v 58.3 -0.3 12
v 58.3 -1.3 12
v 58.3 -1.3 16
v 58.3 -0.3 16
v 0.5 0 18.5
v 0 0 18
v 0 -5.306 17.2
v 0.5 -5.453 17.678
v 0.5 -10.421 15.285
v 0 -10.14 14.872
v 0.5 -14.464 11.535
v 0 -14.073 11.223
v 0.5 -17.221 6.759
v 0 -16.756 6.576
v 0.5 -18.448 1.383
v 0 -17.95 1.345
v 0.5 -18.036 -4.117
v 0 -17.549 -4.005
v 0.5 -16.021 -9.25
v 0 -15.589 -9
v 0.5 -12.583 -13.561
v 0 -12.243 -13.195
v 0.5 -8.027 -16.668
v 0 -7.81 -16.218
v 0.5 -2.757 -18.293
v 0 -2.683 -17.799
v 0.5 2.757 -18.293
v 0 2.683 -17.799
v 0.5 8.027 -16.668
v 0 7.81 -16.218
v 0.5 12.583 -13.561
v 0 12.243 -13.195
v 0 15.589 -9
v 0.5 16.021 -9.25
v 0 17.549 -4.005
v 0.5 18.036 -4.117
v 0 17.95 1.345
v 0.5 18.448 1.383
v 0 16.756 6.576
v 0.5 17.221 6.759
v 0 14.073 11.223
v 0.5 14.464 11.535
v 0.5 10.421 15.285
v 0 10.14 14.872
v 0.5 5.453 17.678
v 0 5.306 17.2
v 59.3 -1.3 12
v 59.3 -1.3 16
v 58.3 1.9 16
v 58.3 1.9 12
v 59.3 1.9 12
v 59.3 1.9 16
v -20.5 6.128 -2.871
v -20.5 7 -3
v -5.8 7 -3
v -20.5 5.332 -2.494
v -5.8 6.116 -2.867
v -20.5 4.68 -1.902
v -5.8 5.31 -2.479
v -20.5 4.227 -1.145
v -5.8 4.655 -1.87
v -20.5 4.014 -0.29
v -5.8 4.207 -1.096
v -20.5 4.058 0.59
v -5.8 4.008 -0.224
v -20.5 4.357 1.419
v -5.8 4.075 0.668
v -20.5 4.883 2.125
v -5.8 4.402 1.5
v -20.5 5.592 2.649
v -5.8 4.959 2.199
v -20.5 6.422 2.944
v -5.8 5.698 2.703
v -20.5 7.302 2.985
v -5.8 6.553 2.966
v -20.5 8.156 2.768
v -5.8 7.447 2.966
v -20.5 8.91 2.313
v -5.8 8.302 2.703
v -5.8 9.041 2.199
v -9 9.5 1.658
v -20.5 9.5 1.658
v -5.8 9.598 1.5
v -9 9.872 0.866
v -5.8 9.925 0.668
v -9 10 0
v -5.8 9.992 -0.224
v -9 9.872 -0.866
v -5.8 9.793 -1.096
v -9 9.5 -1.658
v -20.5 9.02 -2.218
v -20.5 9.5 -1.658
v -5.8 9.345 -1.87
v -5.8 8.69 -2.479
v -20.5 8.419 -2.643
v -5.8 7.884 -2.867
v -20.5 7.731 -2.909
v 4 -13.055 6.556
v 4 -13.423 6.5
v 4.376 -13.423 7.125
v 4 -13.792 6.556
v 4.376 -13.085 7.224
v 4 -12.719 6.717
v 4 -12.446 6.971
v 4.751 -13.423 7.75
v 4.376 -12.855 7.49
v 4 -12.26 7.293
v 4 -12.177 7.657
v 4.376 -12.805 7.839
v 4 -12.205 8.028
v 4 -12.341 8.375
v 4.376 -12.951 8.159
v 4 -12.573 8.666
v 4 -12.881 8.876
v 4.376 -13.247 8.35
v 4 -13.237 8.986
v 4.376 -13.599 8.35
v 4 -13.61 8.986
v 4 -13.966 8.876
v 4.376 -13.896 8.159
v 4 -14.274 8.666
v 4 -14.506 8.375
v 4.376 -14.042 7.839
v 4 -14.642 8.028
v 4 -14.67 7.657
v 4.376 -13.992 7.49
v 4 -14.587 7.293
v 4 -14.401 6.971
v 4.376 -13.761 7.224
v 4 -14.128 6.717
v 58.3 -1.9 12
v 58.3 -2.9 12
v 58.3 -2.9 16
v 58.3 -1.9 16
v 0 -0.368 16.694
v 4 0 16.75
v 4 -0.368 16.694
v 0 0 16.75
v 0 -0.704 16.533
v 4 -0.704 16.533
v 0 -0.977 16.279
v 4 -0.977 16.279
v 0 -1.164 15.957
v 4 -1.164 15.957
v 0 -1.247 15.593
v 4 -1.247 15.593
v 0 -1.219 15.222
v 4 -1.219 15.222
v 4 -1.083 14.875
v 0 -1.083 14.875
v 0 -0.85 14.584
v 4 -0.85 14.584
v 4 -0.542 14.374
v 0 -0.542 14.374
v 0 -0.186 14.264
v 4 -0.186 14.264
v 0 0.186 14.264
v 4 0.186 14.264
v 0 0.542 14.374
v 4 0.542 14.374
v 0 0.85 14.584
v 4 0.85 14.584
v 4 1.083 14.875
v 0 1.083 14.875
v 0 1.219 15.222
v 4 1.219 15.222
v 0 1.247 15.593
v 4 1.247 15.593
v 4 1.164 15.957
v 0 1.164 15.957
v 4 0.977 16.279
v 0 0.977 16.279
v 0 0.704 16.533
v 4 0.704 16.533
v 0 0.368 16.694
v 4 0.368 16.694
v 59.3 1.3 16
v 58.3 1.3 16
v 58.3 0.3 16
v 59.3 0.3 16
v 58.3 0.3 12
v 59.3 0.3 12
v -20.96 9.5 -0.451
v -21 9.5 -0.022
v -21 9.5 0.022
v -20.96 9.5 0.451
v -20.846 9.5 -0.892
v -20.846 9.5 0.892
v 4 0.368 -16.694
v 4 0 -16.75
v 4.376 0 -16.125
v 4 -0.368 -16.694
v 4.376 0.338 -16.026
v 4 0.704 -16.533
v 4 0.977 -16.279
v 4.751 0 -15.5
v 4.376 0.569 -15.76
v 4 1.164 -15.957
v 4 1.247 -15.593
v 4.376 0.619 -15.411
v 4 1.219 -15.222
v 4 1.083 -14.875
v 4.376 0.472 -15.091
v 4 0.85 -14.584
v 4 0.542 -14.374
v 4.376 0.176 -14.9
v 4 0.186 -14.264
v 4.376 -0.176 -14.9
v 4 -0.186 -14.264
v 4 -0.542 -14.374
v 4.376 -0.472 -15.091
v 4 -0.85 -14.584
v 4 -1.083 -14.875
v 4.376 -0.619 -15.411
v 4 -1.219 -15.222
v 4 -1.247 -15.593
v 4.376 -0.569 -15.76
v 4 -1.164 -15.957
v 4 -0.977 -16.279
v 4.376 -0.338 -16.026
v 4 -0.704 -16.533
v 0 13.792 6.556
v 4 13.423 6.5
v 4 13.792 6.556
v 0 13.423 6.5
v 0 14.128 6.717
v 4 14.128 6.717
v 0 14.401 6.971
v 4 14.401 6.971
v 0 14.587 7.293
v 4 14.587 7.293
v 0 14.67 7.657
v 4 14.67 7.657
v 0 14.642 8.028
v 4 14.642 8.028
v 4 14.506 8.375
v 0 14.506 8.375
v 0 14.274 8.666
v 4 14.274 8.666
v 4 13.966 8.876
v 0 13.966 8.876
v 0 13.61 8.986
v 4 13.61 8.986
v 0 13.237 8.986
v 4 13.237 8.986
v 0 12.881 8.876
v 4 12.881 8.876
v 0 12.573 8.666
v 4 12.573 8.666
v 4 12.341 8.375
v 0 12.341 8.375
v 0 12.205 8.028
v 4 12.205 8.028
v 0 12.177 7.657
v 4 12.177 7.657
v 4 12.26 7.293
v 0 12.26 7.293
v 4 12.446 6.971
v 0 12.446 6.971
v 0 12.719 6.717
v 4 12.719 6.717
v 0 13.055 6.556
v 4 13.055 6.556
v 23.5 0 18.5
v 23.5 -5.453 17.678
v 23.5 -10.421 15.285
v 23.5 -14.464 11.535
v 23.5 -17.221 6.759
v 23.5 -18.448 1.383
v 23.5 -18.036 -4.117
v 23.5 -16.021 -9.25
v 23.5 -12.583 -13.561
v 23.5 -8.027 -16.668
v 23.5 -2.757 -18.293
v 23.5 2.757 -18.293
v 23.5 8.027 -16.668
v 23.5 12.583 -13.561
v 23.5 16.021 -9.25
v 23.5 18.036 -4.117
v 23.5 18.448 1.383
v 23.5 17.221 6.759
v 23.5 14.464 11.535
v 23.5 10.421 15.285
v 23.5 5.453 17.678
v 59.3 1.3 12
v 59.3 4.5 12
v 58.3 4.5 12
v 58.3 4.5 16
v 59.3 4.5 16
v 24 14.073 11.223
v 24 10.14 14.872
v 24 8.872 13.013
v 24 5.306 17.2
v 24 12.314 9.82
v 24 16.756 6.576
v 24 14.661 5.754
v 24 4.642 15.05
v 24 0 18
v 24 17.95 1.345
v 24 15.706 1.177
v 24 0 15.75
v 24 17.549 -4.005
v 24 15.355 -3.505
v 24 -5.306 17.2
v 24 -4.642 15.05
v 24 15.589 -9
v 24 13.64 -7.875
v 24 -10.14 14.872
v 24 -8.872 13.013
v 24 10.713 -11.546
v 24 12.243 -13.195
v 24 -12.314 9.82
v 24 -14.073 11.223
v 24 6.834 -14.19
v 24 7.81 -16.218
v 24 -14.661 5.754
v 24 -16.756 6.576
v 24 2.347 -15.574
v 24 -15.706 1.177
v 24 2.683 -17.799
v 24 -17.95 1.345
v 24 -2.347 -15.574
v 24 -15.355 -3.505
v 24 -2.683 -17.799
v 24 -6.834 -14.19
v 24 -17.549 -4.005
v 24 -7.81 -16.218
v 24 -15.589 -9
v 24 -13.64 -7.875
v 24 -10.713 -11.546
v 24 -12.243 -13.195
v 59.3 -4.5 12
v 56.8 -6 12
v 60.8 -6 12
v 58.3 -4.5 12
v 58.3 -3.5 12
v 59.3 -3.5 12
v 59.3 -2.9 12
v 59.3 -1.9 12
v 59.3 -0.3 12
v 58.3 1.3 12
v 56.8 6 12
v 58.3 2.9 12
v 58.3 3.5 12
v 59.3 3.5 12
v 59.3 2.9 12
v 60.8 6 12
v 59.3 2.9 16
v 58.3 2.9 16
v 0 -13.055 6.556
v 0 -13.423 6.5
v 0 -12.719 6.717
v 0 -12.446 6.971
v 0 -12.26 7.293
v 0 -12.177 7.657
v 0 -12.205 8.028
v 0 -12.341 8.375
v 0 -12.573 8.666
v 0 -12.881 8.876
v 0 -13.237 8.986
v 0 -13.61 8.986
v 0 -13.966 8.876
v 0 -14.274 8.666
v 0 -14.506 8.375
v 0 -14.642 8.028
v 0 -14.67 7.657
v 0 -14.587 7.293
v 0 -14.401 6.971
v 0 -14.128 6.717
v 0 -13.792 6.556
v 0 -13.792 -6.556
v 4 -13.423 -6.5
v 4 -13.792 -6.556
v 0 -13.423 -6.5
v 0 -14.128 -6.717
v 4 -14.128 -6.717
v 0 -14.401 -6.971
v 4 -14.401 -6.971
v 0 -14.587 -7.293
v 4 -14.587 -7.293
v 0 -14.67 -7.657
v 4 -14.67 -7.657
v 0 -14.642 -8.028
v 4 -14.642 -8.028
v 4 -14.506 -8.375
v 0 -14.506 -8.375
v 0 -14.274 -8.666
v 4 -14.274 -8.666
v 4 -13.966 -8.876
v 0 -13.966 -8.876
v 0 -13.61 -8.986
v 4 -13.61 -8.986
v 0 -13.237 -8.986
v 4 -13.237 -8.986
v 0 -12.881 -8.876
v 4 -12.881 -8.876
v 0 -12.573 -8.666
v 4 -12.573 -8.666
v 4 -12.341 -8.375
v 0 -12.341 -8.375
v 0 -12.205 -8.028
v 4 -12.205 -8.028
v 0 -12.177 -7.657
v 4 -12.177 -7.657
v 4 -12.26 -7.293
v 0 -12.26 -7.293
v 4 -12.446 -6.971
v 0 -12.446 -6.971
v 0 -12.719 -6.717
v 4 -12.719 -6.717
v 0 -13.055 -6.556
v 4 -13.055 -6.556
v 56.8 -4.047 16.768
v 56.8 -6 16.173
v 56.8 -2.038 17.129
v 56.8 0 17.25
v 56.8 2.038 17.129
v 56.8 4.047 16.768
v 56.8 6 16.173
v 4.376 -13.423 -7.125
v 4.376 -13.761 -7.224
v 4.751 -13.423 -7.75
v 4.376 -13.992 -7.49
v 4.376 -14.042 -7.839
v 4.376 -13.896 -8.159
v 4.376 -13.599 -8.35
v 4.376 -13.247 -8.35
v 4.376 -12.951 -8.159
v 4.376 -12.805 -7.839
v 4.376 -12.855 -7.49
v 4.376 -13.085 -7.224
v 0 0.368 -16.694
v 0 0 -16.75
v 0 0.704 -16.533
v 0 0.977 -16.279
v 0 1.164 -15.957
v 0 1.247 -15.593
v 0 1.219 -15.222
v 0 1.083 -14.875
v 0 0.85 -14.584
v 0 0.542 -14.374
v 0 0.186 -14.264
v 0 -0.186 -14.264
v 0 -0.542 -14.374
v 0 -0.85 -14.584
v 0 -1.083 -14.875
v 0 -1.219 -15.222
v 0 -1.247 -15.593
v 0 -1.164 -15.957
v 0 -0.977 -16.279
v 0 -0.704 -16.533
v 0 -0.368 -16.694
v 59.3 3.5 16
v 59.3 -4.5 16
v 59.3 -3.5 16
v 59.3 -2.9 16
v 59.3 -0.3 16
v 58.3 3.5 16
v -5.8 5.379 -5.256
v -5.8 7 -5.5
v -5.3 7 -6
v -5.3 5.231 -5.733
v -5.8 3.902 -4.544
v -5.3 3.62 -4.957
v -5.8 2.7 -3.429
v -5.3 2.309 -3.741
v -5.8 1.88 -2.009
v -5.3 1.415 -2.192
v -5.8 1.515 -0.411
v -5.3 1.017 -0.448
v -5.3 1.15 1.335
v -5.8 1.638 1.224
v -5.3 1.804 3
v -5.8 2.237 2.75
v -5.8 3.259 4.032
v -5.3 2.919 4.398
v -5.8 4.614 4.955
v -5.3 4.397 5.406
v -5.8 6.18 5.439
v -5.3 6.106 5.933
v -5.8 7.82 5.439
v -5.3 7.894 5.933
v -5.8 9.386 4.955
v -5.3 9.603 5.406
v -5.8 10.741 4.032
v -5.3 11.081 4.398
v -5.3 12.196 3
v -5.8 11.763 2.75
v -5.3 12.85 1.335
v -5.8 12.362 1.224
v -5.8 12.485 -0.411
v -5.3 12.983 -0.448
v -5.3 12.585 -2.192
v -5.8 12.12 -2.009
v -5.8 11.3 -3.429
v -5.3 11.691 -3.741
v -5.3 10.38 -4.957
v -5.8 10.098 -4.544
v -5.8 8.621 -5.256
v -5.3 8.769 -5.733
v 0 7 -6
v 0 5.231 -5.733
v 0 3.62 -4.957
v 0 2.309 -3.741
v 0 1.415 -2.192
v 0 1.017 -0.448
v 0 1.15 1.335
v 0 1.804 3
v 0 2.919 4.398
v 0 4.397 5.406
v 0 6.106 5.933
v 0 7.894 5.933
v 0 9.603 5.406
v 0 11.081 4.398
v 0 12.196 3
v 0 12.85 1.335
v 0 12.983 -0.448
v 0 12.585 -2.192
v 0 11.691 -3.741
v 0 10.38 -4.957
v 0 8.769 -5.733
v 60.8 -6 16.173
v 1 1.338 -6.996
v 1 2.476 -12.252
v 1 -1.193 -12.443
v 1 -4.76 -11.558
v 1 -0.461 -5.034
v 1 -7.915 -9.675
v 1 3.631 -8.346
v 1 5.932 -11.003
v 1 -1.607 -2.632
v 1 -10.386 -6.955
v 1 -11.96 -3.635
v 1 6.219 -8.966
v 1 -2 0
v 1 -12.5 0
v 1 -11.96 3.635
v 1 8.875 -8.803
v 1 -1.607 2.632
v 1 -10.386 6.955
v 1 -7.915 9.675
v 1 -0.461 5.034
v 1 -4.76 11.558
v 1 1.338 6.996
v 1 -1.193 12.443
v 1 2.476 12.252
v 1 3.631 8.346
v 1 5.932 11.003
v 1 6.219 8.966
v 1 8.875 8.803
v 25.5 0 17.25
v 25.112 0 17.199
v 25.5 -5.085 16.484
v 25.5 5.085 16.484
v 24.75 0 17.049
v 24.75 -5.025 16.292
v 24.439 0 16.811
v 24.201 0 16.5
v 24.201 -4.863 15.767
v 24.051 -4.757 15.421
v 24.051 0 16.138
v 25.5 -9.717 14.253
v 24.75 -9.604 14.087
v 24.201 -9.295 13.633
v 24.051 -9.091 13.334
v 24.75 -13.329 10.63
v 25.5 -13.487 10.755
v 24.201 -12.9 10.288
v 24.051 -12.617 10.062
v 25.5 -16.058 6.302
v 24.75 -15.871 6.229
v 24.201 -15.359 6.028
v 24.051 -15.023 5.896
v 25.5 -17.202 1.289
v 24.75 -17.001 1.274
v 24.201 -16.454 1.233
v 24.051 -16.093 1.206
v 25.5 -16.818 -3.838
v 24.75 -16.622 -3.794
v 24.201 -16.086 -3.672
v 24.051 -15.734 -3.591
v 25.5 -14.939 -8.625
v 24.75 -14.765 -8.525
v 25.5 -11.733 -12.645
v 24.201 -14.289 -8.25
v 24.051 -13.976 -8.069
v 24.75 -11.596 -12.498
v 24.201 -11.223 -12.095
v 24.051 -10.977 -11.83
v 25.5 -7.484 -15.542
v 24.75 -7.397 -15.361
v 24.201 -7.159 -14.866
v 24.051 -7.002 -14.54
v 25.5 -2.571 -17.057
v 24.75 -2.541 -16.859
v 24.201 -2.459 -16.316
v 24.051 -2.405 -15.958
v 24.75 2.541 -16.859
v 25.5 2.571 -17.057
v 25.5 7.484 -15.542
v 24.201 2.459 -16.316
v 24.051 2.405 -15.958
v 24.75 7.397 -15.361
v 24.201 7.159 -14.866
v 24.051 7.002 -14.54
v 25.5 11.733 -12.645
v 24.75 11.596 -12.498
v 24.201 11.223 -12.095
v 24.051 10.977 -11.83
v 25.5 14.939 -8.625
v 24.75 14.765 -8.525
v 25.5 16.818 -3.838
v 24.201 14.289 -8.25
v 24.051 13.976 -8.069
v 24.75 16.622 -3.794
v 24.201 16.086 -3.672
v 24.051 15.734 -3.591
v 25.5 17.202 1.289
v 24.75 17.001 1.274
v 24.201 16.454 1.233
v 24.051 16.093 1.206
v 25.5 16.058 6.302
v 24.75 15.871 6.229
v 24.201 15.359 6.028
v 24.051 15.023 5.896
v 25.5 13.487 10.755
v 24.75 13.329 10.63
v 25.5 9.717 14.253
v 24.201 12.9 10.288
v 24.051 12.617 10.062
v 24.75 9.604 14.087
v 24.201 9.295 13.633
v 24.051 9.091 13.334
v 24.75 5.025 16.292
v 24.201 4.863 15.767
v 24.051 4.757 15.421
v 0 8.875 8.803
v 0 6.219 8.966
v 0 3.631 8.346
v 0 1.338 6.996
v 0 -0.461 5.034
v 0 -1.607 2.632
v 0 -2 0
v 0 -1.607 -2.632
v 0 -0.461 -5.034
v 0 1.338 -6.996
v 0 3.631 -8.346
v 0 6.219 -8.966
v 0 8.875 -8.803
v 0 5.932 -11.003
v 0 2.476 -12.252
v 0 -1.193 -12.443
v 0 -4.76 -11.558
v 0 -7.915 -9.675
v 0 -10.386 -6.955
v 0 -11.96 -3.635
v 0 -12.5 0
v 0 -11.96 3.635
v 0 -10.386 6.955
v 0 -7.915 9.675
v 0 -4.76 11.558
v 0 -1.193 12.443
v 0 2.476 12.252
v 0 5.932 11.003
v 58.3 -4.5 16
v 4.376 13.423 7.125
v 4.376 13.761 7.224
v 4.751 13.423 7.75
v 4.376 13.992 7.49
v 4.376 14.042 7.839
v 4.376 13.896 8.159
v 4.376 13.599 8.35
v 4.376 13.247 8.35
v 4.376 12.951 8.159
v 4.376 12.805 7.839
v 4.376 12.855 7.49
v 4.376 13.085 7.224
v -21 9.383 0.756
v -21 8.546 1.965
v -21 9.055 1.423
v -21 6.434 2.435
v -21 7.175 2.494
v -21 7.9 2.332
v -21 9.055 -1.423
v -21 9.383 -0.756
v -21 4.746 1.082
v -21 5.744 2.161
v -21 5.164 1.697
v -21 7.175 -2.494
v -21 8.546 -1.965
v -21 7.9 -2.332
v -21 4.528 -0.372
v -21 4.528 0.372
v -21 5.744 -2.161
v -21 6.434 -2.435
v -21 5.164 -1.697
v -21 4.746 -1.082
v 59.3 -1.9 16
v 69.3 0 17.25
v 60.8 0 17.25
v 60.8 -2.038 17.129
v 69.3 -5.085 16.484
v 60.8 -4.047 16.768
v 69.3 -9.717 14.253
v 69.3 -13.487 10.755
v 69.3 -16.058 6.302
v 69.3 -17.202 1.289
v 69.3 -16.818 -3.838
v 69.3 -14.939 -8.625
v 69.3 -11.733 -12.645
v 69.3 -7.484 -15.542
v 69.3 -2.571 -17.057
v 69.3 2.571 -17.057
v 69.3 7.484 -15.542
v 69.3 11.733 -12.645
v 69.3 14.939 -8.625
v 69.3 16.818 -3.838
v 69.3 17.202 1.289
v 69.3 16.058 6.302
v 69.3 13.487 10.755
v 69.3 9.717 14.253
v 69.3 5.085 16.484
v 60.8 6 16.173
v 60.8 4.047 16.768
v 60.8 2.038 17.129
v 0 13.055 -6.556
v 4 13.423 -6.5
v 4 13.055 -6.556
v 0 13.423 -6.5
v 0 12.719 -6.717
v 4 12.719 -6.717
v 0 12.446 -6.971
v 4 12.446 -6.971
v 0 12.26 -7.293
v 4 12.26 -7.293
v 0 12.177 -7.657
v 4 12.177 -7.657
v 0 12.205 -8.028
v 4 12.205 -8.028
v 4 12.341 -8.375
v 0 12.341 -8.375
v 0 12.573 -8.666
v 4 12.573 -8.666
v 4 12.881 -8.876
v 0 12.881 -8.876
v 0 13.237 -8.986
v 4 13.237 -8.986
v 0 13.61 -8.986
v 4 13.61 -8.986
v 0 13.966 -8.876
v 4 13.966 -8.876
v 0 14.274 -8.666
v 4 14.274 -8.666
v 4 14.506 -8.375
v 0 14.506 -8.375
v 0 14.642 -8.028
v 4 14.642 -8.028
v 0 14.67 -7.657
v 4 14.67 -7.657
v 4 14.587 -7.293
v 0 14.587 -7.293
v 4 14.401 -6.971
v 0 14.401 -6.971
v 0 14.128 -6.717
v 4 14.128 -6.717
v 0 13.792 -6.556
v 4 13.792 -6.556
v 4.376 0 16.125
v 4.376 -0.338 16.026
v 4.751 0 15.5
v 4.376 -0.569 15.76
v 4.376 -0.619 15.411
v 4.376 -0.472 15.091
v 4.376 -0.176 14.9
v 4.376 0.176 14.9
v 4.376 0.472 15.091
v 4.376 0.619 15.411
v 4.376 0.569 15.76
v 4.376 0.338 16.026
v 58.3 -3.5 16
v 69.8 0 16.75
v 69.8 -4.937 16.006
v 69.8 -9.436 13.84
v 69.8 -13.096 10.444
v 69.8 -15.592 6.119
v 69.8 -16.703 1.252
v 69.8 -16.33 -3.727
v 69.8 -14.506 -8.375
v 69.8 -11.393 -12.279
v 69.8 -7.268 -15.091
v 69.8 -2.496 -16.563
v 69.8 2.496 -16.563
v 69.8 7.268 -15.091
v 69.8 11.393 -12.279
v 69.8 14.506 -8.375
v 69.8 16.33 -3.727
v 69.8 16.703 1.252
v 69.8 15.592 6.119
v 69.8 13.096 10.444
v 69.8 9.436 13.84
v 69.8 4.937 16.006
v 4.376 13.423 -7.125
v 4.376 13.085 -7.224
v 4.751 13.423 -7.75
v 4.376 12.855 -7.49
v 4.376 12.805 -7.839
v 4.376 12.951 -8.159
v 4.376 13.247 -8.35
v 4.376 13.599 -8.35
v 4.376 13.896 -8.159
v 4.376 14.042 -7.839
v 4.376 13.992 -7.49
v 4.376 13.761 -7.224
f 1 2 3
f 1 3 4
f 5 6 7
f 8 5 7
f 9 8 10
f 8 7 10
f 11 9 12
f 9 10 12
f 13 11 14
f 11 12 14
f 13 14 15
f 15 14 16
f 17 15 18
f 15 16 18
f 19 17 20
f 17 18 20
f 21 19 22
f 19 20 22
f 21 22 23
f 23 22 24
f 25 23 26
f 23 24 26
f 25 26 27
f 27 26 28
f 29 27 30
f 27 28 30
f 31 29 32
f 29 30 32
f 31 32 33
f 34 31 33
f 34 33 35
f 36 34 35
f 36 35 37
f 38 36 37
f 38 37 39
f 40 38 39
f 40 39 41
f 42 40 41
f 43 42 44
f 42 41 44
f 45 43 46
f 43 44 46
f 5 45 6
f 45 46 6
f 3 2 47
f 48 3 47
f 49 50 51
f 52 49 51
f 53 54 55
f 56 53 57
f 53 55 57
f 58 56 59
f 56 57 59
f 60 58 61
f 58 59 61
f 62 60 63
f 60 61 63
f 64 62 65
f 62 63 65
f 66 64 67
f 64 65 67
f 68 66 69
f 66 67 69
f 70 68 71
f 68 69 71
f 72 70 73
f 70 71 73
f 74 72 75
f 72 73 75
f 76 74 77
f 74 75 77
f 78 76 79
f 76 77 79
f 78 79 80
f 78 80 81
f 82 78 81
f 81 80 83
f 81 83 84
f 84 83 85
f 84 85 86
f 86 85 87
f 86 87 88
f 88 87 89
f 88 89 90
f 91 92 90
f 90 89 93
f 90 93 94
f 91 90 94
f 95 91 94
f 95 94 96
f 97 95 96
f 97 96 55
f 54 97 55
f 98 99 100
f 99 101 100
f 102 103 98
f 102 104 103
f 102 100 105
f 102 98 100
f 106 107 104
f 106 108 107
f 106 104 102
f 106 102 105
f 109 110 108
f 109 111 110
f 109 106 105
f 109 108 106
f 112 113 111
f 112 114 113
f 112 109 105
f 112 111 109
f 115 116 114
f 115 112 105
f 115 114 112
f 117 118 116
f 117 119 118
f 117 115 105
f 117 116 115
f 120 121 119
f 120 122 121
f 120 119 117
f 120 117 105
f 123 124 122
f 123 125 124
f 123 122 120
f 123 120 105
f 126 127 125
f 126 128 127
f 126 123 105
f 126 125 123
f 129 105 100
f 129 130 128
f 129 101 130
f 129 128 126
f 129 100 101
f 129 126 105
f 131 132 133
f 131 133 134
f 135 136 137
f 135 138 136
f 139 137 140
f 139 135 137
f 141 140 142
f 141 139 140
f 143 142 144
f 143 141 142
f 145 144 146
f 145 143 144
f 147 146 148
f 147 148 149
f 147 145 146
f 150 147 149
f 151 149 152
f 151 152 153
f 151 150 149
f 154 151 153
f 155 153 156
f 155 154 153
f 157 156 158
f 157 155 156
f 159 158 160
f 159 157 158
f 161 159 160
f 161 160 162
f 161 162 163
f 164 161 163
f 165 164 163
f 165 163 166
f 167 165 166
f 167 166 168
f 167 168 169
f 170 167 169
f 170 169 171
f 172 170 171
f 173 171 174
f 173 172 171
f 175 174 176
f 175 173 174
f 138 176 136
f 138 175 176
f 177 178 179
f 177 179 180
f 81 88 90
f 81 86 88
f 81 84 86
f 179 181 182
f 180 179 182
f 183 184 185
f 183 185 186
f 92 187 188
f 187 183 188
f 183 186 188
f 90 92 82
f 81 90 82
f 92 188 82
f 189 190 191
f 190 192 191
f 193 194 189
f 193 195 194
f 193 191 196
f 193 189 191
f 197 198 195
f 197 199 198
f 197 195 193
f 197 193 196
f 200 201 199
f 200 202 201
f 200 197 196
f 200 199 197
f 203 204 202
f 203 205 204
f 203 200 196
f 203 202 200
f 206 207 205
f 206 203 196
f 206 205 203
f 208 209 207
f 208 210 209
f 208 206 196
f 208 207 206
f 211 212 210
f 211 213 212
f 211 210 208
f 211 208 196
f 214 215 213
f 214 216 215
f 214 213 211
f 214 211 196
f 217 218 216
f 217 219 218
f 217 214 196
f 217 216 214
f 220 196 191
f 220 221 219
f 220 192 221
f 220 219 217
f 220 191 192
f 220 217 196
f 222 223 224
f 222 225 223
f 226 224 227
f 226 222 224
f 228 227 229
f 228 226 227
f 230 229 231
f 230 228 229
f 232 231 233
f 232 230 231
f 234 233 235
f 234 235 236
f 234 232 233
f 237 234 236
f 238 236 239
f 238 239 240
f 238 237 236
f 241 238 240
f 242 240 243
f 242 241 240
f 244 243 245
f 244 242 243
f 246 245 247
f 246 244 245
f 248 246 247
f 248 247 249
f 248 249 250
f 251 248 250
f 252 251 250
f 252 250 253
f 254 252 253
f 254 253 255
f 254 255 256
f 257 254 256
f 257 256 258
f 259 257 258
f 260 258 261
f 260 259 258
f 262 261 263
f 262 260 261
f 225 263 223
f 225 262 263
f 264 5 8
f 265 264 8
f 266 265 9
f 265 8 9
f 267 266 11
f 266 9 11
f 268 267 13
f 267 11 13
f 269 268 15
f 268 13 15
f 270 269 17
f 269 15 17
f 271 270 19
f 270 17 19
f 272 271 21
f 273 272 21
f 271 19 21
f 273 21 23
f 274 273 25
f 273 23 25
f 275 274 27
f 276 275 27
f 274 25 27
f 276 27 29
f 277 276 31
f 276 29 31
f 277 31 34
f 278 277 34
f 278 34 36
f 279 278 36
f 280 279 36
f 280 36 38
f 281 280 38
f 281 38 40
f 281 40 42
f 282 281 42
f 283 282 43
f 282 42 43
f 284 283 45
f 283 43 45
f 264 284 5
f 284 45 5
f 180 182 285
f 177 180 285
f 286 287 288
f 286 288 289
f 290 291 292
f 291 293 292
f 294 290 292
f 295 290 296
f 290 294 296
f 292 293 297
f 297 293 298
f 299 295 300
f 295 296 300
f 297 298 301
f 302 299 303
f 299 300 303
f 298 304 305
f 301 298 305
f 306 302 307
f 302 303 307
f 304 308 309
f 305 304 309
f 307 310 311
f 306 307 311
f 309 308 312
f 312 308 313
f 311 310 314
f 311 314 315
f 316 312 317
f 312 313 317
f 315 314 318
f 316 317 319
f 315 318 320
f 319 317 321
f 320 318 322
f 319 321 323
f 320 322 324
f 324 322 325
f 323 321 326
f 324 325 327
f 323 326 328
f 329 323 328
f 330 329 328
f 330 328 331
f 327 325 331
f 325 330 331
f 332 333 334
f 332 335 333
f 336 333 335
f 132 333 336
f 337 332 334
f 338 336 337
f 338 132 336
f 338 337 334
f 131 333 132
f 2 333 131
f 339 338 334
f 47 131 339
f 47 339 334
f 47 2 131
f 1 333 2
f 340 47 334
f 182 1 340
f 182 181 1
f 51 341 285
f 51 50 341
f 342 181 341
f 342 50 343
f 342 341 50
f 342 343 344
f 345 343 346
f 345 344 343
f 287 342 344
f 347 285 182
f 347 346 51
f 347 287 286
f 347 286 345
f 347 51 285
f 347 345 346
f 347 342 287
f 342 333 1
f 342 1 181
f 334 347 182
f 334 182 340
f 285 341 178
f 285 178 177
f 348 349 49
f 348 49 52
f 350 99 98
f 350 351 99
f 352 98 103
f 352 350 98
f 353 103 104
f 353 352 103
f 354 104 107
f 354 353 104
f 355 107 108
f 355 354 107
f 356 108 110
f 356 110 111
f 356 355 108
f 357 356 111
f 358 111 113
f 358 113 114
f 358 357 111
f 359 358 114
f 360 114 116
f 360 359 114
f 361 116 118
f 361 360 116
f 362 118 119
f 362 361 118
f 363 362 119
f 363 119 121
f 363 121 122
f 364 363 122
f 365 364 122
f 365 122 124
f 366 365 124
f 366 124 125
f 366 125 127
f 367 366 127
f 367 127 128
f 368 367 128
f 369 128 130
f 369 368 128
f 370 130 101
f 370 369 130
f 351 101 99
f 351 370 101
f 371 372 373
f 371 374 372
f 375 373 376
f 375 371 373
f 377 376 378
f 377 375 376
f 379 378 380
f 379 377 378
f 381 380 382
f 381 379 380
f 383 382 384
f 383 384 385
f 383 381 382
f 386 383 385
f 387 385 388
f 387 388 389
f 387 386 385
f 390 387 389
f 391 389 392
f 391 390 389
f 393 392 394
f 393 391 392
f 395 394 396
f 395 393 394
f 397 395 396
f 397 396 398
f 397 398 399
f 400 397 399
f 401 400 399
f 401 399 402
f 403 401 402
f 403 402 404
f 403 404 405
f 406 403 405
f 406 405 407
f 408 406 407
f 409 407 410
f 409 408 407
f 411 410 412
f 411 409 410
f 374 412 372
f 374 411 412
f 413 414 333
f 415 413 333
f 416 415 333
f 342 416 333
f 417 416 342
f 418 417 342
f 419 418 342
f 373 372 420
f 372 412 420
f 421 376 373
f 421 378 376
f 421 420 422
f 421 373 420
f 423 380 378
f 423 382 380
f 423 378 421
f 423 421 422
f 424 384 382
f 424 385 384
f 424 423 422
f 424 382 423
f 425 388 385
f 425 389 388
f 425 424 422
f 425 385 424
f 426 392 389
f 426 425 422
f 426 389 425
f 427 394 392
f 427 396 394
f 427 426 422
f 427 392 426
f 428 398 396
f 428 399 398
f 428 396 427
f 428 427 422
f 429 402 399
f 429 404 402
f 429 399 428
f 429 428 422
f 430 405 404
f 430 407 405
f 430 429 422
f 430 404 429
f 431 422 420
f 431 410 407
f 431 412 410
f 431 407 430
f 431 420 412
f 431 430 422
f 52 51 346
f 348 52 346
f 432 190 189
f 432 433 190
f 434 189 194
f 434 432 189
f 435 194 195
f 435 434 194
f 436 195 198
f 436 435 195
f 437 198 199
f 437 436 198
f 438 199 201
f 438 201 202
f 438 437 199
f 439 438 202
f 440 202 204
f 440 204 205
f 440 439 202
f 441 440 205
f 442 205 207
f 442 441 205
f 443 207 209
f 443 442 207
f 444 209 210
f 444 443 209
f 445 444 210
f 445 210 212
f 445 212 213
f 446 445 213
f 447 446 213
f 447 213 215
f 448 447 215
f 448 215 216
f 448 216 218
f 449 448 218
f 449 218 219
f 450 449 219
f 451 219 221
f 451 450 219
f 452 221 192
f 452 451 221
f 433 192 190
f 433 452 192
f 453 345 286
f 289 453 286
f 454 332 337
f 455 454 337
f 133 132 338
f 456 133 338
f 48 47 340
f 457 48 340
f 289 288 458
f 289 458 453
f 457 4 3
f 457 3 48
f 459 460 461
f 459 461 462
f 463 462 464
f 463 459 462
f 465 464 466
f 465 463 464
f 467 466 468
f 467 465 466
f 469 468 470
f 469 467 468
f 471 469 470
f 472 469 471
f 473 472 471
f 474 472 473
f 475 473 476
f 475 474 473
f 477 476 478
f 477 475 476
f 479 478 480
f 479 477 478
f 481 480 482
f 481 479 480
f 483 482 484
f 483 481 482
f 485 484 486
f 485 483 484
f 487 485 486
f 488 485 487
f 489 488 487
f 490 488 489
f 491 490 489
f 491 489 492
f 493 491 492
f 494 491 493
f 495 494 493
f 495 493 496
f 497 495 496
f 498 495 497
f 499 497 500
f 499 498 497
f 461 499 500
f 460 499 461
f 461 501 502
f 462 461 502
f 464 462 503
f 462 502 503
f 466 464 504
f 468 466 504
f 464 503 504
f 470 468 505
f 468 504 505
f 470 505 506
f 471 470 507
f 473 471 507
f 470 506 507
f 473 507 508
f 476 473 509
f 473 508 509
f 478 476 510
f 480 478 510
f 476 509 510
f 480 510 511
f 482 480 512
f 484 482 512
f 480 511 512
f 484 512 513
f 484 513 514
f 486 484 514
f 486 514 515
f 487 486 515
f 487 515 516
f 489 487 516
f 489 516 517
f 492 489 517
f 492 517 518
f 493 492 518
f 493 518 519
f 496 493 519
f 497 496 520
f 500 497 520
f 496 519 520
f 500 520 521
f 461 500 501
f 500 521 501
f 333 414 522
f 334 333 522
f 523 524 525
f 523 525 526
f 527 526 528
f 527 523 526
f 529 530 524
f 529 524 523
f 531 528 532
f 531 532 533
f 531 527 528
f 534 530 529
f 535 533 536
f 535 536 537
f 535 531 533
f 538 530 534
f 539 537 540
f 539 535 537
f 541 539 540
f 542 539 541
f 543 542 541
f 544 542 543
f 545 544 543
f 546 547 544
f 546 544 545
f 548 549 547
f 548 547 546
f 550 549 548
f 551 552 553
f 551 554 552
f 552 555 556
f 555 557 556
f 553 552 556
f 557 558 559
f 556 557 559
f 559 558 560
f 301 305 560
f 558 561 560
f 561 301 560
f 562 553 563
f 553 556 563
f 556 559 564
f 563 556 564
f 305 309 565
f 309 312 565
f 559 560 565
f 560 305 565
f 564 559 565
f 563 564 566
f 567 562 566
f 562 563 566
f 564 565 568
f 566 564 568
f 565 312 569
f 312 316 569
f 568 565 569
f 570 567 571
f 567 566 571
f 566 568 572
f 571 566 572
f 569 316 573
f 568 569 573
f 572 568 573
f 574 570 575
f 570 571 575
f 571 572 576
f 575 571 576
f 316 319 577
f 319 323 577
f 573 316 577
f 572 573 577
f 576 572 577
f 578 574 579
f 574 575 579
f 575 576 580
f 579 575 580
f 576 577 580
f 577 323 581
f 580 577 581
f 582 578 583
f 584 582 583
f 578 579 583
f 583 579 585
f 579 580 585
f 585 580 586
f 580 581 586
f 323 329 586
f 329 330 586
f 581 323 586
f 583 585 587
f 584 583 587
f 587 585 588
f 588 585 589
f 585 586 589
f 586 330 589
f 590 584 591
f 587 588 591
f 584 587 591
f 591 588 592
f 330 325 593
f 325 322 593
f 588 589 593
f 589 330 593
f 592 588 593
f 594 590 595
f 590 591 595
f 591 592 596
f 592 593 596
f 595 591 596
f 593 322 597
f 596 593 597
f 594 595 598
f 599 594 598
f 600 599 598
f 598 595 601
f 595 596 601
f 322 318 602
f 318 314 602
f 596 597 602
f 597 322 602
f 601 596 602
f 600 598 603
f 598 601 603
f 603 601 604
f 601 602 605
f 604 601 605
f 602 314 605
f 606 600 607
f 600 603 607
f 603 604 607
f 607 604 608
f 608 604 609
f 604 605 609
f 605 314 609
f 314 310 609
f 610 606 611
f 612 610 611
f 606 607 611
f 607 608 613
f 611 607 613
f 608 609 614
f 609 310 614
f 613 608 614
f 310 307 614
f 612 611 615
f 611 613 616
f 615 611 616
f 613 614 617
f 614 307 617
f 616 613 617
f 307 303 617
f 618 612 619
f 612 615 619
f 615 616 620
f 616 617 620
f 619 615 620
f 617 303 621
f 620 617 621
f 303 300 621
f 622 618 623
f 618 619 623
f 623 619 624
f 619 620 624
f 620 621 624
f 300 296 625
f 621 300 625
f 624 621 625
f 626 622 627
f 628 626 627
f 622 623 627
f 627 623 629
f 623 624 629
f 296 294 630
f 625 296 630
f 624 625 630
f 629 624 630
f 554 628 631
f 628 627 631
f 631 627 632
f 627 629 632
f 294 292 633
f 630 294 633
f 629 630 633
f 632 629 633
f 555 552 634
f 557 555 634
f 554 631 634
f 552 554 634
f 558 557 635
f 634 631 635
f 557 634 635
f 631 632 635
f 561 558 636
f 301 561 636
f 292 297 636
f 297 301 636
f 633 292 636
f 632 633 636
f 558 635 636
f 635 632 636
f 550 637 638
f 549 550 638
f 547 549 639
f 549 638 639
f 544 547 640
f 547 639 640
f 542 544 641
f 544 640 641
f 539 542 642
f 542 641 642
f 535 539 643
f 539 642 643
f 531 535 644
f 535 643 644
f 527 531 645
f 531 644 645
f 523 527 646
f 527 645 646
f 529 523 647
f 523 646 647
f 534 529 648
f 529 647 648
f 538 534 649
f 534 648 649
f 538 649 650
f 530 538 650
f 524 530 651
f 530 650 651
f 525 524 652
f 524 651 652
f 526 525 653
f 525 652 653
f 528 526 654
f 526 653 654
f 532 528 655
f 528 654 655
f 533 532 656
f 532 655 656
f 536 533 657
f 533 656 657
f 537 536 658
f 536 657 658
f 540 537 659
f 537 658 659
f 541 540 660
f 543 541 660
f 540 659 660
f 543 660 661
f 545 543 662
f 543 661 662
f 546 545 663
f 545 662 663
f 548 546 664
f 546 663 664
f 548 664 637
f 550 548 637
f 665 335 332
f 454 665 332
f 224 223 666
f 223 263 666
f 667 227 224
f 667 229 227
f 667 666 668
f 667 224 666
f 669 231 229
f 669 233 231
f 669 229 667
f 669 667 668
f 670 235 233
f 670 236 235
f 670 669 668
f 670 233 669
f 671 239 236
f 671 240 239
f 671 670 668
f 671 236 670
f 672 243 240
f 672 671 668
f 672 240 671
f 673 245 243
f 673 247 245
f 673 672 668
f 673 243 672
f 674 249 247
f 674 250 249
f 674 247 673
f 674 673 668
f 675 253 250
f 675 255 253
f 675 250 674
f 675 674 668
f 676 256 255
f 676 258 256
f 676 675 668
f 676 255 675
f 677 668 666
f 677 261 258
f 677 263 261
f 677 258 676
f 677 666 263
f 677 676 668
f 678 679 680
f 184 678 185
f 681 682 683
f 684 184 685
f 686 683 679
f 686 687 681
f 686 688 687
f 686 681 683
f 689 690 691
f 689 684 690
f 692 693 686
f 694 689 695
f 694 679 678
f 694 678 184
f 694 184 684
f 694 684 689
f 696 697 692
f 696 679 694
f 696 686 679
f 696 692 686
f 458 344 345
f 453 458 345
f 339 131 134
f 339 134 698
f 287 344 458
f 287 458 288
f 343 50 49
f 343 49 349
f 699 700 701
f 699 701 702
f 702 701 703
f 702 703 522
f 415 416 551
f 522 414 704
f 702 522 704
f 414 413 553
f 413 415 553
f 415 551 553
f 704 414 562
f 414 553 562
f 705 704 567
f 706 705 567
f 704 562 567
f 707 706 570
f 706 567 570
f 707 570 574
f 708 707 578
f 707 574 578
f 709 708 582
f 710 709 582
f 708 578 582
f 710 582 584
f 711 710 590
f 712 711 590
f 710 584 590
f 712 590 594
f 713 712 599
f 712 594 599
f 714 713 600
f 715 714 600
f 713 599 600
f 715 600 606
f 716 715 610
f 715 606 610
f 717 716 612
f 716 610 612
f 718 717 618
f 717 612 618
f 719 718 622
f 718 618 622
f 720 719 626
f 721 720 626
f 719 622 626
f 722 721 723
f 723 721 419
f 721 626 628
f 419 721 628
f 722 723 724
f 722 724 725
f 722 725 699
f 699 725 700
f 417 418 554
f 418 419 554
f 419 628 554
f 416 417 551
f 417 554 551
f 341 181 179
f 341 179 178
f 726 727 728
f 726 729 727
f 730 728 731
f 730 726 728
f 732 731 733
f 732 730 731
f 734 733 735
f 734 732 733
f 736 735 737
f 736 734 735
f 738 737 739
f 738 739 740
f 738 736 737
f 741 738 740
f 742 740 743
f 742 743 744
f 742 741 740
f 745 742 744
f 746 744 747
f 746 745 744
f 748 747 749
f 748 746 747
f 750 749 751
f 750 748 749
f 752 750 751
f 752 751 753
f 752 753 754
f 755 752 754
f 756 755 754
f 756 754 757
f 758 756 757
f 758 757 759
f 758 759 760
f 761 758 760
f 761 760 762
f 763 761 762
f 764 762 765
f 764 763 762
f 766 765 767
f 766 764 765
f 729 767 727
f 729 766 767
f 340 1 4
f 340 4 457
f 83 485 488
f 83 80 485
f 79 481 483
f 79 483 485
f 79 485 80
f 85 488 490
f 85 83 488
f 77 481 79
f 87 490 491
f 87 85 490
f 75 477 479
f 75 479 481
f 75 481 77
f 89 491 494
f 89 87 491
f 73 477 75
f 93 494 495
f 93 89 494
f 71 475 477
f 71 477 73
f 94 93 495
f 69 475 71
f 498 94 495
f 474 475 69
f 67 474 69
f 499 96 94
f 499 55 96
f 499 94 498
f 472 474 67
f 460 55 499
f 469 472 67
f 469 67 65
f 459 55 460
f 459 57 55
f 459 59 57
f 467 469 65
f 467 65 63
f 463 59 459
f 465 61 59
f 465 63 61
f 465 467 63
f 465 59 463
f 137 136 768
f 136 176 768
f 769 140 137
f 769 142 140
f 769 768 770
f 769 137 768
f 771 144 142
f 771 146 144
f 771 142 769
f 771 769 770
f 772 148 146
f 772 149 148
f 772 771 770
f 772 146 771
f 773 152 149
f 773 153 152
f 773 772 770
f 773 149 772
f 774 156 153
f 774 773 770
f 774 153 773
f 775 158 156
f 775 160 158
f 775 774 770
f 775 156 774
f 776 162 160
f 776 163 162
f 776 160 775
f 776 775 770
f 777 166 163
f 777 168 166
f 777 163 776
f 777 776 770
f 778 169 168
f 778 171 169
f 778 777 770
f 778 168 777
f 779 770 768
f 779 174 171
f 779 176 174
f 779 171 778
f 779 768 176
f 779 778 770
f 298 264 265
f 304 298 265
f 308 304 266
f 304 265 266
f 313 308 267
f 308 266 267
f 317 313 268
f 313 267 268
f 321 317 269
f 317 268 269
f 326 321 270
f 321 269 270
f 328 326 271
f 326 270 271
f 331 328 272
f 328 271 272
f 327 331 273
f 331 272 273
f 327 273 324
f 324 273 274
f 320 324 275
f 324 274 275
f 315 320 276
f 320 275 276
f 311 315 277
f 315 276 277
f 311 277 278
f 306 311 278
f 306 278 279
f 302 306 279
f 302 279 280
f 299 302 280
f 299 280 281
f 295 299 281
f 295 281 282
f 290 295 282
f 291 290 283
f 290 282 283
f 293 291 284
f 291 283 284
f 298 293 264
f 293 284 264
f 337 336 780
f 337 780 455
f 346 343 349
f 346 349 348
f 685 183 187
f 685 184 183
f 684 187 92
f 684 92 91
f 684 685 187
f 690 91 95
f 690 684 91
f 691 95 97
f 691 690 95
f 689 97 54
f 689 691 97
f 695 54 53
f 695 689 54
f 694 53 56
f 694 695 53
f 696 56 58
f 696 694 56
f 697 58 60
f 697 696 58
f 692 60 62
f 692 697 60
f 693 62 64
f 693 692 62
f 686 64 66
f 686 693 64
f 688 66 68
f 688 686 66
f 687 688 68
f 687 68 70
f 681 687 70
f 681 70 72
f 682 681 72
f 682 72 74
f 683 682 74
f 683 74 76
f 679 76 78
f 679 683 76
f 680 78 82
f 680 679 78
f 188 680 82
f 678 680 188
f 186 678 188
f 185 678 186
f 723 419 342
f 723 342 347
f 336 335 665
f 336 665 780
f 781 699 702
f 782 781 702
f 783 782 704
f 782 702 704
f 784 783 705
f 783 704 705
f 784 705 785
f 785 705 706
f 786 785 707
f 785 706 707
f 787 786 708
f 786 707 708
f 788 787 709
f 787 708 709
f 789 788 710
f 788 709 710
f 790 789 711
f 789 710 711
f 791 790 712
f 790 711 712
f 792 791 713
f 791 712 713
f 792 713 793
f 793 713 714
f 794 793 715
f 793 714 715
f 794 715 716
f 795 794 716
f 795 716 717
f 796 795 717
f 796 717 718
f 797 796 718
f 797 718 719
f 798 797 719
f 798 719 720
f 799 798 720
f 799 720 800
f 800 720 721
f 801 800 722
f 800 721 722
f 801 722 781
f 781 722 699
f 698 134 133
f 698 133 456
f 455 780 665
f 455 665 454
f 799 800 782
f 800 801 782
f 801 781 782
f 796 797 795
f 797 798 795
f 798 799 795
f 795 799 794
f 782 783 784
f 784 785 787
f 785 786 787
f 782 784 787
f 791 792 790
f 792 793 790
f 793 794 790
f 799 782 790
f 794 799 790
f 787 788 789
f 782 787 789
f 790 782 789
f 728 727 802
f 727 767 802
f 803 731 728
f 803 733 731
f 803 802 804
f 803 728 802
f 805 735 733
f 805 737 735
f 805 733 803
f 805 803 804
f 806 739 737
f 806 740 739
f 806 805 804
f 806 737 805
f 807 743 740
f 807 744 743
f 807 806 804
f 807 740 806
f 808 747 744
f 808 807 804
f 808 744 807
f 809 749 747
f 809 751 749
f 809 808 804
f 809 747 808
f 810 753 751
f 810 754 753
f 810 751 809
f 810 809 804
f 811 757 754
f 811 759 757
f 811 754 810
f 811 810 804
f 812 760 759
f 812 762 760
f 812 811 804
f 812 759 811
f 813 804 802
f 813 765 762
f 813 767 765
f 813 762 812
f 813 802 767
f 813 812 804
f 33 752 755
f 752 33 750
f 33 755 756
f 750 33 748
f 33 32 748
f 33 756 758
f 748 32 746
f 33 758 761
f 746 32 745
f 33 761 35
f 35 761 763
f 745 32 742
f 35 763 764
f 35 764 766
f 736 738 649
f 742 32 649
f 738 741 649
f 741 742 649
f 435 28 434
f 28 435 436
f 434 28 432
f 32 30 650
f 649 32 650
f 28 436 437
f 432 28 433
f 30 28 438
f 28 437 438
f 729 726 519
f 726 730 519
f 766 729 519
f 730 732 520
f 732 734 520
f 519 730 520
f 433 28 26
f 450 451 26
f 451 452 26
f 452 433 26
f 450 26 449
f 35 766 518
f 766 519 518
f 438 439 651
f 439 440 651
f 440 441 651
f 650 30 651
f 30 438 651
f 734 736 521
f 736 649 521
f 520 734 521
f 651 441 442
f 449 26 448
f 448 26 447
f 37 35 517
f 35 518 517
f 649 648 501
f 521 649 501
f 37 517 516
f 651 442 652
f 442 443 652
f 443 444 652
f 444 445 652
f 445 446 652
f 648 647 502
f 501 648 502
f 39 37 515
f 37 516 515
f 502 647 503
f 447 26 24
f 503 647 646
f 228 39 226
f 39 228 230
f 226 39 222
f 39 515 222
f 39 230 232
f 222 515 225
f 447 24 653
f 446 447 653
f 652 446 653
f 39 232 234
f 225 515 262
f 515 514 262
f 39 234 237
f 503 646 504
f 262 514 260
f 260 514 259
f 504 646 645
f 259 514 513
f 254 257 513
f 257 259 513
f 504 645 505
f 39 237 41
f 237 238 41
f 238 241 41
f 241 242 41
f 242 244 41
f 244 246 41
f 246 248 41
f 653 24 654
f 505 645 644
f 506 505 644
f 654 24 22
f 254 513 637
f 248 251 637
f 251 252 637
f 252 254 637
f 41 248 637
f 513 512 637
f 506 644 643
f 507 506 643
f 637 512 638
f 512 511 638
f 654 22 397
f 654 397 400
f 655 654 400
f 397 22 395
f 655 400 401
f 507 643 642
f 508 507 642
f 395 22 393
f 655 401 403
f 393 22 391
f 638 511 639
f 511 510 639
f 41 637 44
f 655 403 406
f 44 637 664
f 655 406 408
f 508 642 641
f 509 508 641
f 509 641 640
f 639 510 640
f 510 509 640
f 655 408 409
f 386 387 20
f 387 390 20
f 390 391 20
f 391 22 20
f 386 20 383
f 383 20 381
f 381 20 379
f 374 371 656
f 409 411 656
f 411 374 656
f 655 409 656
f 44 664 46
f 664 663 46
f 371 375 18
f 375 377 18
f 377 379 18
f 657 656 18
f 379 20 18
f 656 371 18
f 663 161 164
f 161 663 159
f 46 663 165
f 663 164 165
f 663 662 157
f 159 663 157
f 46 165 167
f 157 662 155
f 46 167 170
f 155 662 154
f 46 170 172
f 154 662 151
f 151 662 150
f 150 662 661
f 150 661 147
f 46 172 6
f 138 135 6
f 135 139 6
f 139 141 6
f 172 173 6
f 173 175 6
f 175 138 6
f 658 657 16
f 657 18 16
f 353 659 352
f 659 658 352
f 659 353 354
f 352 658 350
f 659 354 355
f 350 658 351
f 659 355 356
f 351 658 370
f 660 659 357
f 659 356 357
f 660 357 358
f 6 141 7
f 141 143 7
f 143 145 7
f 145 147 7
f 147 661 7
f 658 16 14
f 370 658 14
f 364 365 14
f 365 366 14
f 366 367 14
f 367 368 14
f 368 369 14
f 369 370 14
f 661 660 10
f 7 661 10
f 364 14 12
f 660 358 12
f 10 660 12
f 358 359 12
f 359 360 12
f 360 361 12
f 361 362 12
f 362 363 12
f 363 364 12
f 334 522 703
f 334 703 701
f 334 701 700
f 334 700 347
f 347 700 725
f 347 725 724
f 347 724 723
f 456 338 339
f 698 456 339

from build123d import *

# Parameters (mm, degrees)
SKETCH3_R                  = 6
BOSS_EXTRUDE1_DEPTH        = 5.8
SKETCH4_R                  = 3
BOSS_EXTRUDE2_DEPTH        = 15.2
SKETCH5_W                  = 3.31662479
SKETCH5_H                  = 2.173071946
CUT_EXTRUDE1_DEPTH         = 12
CHAMFER1_SIZE              = 0.5
CUT_EXTRUDE2_DEPTH         = 1
M3_TAPPED_HOLE1_AT_2_COUNT = 2
M3_TAPPED_HOLE1_AT_2_PITCH = 26.846787517
M3_TAPPED_HOLE1_AT_3_COUNT = 2
M3_TAPPED_HOLE1_AT_3_PITCH = 26.846787517
CIRPATTERN1_COUNT          = 2
SKETCH10_W                 = 4
SKETCH10_H                 = 12
CUT_EXTRUDE3_DEPTH         = 28
SKETCH11_W                 = 1
SKETCH11_H                 = 1
BOSS_EXTRUDE3_DEPTH        = 4
LPATTERN1_COUNT            = 6
LPATTERN1_PITCH            = 1.6


with BuildPart() as part:
    # Sketch1 → Revolve1 (revolve)
    with BuildSketch(Plane(origin=(0, 0, 0), x_dir=(1, 0, 0), z_dir=(0, 1, 0)), mode=Mode.PRIVATE) as revolve1_sk:
        with BuildLine():
            Line((0, 0), (69.8, 0))
            Line((69.8, 0), (69.8, 17.25))
            Line((69.8, 17.25), (25.5, 17.25))
            ThreePointArc((25.5, 17.25), (24.439339828, 16.810660172), (24, 15.75))
            Line((24, 15.75), (24, 18.5))
            Line((24, 18.5), (0, 18.5))
            Line((0, 18.5), (0, 0))
        make_face()
    revolve(revolve1_sk.sketch.rotate(Axis((0, 0, 0), (1, 0, 0)), 180), axis=Axis((0, 0, 0), (1, 0, 0)))

    # Sketch3 → Boss-Extrude1 (add)
    with BuildSketch(Plane.ZY):
        with Locations(Location((0, 7, 0), (0, 0, 180))):
            Circle(SKETCH3_R)
    extrude(amount=BOSS_EXTRUDE1_DEPTH)

    # Sketch4 → Boss-Extrude2 (add)
    with BuildSketch(Plane.ZY.offset(5.8)):
        with Locations(Location((0, 7, 0), (0, 0, 180))):
            Circle(SKETCH4_R)
    extrude(amount=BOSS_EXTRUDE2_DEPTH)

    # Sketch5 → Cut-Extrude1 (cut)
    with BuildSketch(Plane.ZY.offset(21)):
        with Locations((0, 10.586535973)):
            Rectangle(SKETCH5_W, SKETCH5_H)
    extrude(amount=-CUT_EXTRUDE1_DEPTH, mode=Mode.SUBTRACT)

    # Chamfer1
    chamfer1_edges = [part.edges().sort_by_distance(p)[0] for p in [
        (-5.8, 7, 6),
        (-21, 4.356617963, 1.418637165),
        (69.8, 0, -17.25),
        (24, 0, -18.5),
        (0, 0, -18.5),
    ]]
    chamfer(chamfer1_edges, length=CHAMFER1_SIZE - 0.0001)  # a hair under: the kernel refuses the full size

    # Sketch6 → Cut-Extrude2 (cut)
    with BuildSketch(Plane.ZY):
        with BuildLine():
            ThreePointArc((-8.802520946, 8.875), (0, -12.5), (8.802520946, 8.875))
            ThreePointArc((8.802520946, 8.875), (0, -2), (-8.802520946, 8.875))
        make_face()
    extrude(amount=-CUT_EXTRUDE2_DEPTH, mode=Mode.SUBTRACT)

    # Sketch8 → M3 Tapped Hole1 (revolve, cut)
    with BuildSketch(Plane(origin=(0, -13.423393759, -7.75), x_dir=(0, 0, 1), z_dir=(0, 1, 0))):
        Polygon((0, 0), (0, 4.751075774), (1.25, 4), (1.25, 0), align=None)
    m3_tapped_hole1 = revolve(axis=Axis((-6.35, -13.423393759, -7.75), (1, 0, 0)), mode=Mode.SUBTRACT)

    # M3 Tapped Hole1 at 2: M3 Tapped Hole1 ×2
    with Locations(*[(0, i * M3_TAPPED_HOLE1_AT_2_PITCH, 0) for i in range(1, M3_TAPPED_HOLE1_AT_2_COUNT)]):
        add(m3_tapped_hole1, mode=Mode.SUBTRACT)

    # M3 Tapped Hole1 at 3: M3 Tapped Hole1 ×2
    with Locations(*[Vector(0, 0.4999999999999991, 0.8660254037844392) * (i * M3_TAPPED_HOLE1_AT_3_PITCH) for i in range(1, M3_TAPPED_HOLE1_AT_3_COUNT)]):
        add(m3_tapped_hole1, mode=Mode.SUBTRACT)

    # CirPattern1: M3 Tapped Hole1 ×2 about axis
    cirpattern1_axis = Axis((0, 0, 0), (1, 0, 0))
    for i in range(1, CIRPATTERN1_COUNT):
        add(m3_tapped_hole1.rotate(cirpattern1_axis, i * 360 / CIRPATTERN1_COUNT), mode=Mode.SUBTRACT)

    # CirPattern1 copy 1 sketch → CirPattern1 copy 1 (revolve, cut)
    with BuildSketch(Plane(origin=(0, -13.423393759, 7.75), x_dir=(0, 0, -1), z_dir=(0, -1, 0))):
        Polygon((0, 0), (0, 4.751075774), (1.25, 4), (1.25, 0), align=None)
    revolve(axis=Axis((-6.35, -13.423393759, 7.75), (1, 0, 0)), mode=Mode.SUBTRACT)

    # CirPattern1 copy 2 sketch → CirPattern1 copy 2 (revolve, cut)
    with BuildSketch(Plane(origin=(0, 0, -15.5), x_dir=(0, 0, -1), z_dir=(0, -1, 0))):
        Polygon((0, 0), (0, 4.751075774), (1.25, 4), (1.25, 0), align=None)
    revolve(axis=Axis((-6.35, 0, -15.5), (1, 0, 0)), mode=Mode.SUBTRACT)

    # Sketch10 → Cut-Extrude3 (cut)
    with BuildSketch(Plane.XY.offset(40)):
        with Locations((58.8, 0)):
            Rectangle(SKETCH10_W, SKETCH10_H)
    extrude(amount=-CUT_EXTRUDE3_DEPTH, mode=Mode.SUBTRACT)

    # Sketch11 → Boss-Extrude3 (add)
    with BuildSketch(Plane.XY.offset(12)):
        with Locations((58.8, -4)):
            Rectangle(SKETCH11_W, SKETCH11_H)
    boss_extrude3 = extrude(amount=BOSS_EXTRUDE3_DEPTH)

    # LPattern1: Boss-Extrude3 ×6
    with Locations(*[(0, i * LPATTERN1_PITCH, 0) for i in range(1, LPATTERN1_COUNT)]):
        add(boss_extrude3)


solid = part.part
